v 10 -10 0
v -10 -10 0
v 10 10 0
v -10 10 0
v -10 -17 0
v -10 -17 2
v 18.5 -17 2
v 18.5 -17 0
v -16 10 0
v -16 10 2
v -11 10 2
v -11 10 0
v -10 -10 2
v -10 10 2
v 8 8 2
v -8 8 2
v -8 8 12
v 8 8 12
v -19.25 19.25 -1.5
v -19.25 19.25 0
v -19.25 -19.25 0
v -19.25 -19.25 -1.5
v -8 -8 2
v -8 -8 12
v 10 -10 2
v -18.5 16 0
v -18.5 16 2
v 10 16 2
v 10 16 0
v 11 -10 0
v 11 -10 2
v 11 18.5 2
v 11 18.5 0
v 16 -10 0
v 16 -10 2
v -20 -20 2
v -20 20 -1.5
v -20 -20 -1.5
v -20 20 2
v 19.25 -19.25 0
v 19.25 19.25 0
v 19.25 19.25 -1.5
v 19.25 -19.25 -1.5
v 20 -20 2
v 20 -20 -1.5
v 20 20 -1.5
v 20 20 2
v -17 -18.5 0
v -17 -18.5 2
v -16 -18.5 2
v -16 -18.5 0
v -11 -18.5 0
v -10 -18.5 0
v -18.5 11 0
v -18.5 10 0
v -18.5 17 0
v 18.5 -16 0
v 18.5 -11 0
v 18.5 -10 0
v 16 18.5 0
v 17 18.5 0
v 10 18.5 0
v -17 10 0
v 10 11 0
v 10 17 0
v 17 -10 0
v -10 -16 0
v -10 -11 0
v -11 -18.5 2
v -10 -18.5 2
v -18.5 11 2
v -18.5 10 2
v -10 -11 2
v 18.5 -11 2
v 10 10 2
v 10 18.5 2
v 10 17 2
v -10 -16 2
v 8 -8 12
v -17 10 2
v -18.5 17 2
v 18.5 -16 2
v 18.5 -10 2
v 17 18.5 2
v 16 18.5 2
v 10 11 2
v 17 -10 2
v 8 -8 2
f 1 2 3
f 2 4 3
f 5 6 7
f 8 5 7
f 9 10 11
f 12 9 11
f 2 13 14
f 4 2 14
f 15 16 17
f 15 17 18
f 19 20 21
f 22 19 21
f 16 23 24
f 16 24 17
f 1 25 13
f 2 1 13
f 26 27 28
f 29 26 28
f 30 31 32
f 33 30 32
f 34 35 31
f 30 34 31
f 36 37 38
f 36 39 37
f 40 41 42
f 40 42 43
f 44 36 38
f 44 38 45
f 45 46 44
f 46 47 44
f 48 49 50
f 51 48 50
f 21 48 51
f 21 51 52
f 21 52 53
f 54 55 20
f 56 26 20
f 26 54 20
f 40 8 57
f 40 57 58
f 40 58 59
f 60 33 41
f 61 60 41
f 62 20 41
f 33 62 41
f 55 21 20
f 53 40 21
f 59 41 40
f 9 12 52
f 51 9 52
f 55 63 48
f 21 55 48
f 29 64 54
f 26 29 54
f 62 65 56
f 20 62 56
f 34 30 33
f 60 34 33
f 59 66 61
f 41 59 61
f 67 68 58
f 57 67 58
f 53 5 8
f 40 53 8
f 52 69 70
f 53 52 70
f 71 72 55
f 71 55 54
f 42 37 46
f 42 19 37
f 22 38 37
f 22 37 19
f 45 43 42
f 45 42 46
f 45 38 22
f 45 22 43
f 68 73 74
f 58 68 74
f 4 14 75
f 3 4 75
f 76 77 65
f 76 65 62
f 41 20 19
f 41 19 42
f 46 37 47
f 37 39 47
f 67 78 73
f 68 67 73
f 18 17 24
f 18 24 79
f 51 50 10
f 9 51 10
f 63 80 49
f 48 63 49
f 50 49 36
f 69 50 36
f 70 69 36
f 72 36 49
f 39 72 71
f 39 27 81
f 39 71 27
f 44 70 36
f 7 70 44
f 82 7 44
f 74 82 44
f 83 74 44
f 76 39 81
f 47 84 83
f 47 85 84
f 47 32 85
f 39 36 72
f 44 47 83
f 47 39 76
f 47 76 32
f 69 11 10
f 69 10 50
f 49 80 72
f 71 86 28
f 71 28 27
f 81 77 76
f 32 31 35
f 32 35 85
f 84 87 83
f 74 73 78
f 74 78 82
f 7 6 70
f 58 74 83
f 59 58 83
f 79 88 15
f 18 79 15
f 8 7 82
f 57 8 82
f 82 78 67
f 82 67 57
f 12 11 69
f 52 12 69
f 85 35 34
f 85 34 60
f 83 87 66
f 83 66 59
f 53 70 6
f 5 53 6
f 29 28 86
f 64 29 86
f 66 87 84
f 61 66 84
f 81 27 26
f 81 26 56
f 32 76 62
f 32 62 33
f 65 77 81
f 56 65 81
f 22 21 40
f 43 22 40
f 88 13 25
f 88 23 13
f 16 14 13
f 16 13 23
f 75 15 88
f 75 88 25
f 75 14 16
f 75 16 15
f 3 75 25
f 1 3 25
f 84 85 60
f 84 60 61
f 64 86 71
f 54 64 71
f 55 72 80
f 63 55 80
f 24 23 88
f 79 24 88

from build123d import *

# Parameters (mm, degrees)
F0_W     = 40
F0_H     = 40
F1_DEPTH = 2
F2_W     = 40
F2_H     = 40
F2_W_2   = 38.5
F2_H_2   = 38.5
F3_DEPTH = 1.5
F5_W     = 15
F5_H     = 1
F5_W_2   = 5
F5_W_3   = 1
F5_H_2   = 5
F5_H_3   = 15
F5_W_4   = 28.5
F5_H_4   = 28.5
F5_W_5   = 1.5
F5_H_5   = 1.5
F6_DEPTH = 3.501
F7_W     = 16
F7_H     = 16
F8_DEPTH = 10


with BuildPart() as f1:
    # F0 (on Top) → F1 (new body)
    with BuildSketch(Plane.XY):
        Rectangle(F0_W, F0_H)
    extrude(amount=F1_DEPTH)

    # F2 (on face) → F3 (join)
    with BuildSketch(Plane(origin=(0, 0, 0), x_dir=(1, 0, 0), z_dir=(0, 0, -1))):
        Rectangle(F2_W, F2_H)
        Rectangle(F2_W_2, F2_H_2, mode=Mode.SUBTRACT)
    extrude(amount=F3_DEPTH)

    # F5 (on face) → F6 (cut, through all)
    with BuildSketch(Plane.XY.offset(2)):
        with Locations((2.5, -10.5)):
            Rectangle(F5_W, F5_H)
        with Locations((-7.5, -10.5)):
            Rectangle(F5_W_2, F5_H)
        with Locations((10.5, -7.5)):
            Rectangle(F5_W_3, F5_H_2)
        with Locations((10.5, -10.5)):
            Rectangle(F5_W_3, F5_H)
        with Locations((-10.5, -2.5)):
            Rectangle(F5_W_3, F5_H_3)
        with Locations((-10.5, -10.5)):
            Rectangle(F5_W_3, F5_H)
        Polygon((-10, -16), (-10, -11), (-11, -11), (-11, -17), (-10, -17), align=None)
        Polygon((16, -10), (11, -10), (11, -11), (17, -11), (17, -10), align=None)
        with Locations((10.5, 2.5)):
            Rectangle(F5_W_3, F5_H_3)
        with Locations((-10.5, 7.5)):
            Rectangle(F5_W_3, F5_H_2)
        with Locations((4.25, -16.5)):
            Rectangle(F5_W_4, F5_H)
        with Locations((16.5, 4.25)):
            Rectangle(F5_W_3, F5_H_4)
        with Locations((7.5, 10.5)):
            Rectangle(F5_W_2, F5_H)
        with Locations((10.5, 10.5)):
            Rectangle(F5_W_3, F5_H)
        with Locations((-10.5, 10.5)):
            Rectangle(F5_W_3, F5_H)
        with Locations((-2.5, 10.5)):
            Rectangle(F5_W, F5_H)
        with Locations((17.75, -10.5)):
            Rectangle(F5_W_5, F5_H)
        with Locations((-10.5, -17.75)):
            Rectangle(F5_W_3, F5_H_5)
        Polygon((10, 16), (10, 11), (11, 11), (11, 17), (10, 17), align=None)
        Polygon((-16, 10), (-11, 10), (-11, 11), (-17, 11), (-17, 10), align=None)
        with Locations((-4.25, 16.5)):
            Rectangle(F5_W_4, F5_H)
        with Locations((-16.5, -4.25)):
            Rectangle(F5_W_3, F5_H_4)
        with Locations((10.5, 17.75)):
            Rectangle(F5_W_3, F5_H_5)
        with Locations((-17.75, 10.5)):
            Rectangle(F5_W_5, F5_H)
    extrude(amount=-F6_DEPTH, mode=Mode.SUBTRACT)

    # F7 (on face) → F8 (join)
    with BuildSketch(Plane.XY.offset(2)):
        Rectangle(F7_W, F7_H)
    extrude(amount=F8_DEPTH)


solid = f1.part
